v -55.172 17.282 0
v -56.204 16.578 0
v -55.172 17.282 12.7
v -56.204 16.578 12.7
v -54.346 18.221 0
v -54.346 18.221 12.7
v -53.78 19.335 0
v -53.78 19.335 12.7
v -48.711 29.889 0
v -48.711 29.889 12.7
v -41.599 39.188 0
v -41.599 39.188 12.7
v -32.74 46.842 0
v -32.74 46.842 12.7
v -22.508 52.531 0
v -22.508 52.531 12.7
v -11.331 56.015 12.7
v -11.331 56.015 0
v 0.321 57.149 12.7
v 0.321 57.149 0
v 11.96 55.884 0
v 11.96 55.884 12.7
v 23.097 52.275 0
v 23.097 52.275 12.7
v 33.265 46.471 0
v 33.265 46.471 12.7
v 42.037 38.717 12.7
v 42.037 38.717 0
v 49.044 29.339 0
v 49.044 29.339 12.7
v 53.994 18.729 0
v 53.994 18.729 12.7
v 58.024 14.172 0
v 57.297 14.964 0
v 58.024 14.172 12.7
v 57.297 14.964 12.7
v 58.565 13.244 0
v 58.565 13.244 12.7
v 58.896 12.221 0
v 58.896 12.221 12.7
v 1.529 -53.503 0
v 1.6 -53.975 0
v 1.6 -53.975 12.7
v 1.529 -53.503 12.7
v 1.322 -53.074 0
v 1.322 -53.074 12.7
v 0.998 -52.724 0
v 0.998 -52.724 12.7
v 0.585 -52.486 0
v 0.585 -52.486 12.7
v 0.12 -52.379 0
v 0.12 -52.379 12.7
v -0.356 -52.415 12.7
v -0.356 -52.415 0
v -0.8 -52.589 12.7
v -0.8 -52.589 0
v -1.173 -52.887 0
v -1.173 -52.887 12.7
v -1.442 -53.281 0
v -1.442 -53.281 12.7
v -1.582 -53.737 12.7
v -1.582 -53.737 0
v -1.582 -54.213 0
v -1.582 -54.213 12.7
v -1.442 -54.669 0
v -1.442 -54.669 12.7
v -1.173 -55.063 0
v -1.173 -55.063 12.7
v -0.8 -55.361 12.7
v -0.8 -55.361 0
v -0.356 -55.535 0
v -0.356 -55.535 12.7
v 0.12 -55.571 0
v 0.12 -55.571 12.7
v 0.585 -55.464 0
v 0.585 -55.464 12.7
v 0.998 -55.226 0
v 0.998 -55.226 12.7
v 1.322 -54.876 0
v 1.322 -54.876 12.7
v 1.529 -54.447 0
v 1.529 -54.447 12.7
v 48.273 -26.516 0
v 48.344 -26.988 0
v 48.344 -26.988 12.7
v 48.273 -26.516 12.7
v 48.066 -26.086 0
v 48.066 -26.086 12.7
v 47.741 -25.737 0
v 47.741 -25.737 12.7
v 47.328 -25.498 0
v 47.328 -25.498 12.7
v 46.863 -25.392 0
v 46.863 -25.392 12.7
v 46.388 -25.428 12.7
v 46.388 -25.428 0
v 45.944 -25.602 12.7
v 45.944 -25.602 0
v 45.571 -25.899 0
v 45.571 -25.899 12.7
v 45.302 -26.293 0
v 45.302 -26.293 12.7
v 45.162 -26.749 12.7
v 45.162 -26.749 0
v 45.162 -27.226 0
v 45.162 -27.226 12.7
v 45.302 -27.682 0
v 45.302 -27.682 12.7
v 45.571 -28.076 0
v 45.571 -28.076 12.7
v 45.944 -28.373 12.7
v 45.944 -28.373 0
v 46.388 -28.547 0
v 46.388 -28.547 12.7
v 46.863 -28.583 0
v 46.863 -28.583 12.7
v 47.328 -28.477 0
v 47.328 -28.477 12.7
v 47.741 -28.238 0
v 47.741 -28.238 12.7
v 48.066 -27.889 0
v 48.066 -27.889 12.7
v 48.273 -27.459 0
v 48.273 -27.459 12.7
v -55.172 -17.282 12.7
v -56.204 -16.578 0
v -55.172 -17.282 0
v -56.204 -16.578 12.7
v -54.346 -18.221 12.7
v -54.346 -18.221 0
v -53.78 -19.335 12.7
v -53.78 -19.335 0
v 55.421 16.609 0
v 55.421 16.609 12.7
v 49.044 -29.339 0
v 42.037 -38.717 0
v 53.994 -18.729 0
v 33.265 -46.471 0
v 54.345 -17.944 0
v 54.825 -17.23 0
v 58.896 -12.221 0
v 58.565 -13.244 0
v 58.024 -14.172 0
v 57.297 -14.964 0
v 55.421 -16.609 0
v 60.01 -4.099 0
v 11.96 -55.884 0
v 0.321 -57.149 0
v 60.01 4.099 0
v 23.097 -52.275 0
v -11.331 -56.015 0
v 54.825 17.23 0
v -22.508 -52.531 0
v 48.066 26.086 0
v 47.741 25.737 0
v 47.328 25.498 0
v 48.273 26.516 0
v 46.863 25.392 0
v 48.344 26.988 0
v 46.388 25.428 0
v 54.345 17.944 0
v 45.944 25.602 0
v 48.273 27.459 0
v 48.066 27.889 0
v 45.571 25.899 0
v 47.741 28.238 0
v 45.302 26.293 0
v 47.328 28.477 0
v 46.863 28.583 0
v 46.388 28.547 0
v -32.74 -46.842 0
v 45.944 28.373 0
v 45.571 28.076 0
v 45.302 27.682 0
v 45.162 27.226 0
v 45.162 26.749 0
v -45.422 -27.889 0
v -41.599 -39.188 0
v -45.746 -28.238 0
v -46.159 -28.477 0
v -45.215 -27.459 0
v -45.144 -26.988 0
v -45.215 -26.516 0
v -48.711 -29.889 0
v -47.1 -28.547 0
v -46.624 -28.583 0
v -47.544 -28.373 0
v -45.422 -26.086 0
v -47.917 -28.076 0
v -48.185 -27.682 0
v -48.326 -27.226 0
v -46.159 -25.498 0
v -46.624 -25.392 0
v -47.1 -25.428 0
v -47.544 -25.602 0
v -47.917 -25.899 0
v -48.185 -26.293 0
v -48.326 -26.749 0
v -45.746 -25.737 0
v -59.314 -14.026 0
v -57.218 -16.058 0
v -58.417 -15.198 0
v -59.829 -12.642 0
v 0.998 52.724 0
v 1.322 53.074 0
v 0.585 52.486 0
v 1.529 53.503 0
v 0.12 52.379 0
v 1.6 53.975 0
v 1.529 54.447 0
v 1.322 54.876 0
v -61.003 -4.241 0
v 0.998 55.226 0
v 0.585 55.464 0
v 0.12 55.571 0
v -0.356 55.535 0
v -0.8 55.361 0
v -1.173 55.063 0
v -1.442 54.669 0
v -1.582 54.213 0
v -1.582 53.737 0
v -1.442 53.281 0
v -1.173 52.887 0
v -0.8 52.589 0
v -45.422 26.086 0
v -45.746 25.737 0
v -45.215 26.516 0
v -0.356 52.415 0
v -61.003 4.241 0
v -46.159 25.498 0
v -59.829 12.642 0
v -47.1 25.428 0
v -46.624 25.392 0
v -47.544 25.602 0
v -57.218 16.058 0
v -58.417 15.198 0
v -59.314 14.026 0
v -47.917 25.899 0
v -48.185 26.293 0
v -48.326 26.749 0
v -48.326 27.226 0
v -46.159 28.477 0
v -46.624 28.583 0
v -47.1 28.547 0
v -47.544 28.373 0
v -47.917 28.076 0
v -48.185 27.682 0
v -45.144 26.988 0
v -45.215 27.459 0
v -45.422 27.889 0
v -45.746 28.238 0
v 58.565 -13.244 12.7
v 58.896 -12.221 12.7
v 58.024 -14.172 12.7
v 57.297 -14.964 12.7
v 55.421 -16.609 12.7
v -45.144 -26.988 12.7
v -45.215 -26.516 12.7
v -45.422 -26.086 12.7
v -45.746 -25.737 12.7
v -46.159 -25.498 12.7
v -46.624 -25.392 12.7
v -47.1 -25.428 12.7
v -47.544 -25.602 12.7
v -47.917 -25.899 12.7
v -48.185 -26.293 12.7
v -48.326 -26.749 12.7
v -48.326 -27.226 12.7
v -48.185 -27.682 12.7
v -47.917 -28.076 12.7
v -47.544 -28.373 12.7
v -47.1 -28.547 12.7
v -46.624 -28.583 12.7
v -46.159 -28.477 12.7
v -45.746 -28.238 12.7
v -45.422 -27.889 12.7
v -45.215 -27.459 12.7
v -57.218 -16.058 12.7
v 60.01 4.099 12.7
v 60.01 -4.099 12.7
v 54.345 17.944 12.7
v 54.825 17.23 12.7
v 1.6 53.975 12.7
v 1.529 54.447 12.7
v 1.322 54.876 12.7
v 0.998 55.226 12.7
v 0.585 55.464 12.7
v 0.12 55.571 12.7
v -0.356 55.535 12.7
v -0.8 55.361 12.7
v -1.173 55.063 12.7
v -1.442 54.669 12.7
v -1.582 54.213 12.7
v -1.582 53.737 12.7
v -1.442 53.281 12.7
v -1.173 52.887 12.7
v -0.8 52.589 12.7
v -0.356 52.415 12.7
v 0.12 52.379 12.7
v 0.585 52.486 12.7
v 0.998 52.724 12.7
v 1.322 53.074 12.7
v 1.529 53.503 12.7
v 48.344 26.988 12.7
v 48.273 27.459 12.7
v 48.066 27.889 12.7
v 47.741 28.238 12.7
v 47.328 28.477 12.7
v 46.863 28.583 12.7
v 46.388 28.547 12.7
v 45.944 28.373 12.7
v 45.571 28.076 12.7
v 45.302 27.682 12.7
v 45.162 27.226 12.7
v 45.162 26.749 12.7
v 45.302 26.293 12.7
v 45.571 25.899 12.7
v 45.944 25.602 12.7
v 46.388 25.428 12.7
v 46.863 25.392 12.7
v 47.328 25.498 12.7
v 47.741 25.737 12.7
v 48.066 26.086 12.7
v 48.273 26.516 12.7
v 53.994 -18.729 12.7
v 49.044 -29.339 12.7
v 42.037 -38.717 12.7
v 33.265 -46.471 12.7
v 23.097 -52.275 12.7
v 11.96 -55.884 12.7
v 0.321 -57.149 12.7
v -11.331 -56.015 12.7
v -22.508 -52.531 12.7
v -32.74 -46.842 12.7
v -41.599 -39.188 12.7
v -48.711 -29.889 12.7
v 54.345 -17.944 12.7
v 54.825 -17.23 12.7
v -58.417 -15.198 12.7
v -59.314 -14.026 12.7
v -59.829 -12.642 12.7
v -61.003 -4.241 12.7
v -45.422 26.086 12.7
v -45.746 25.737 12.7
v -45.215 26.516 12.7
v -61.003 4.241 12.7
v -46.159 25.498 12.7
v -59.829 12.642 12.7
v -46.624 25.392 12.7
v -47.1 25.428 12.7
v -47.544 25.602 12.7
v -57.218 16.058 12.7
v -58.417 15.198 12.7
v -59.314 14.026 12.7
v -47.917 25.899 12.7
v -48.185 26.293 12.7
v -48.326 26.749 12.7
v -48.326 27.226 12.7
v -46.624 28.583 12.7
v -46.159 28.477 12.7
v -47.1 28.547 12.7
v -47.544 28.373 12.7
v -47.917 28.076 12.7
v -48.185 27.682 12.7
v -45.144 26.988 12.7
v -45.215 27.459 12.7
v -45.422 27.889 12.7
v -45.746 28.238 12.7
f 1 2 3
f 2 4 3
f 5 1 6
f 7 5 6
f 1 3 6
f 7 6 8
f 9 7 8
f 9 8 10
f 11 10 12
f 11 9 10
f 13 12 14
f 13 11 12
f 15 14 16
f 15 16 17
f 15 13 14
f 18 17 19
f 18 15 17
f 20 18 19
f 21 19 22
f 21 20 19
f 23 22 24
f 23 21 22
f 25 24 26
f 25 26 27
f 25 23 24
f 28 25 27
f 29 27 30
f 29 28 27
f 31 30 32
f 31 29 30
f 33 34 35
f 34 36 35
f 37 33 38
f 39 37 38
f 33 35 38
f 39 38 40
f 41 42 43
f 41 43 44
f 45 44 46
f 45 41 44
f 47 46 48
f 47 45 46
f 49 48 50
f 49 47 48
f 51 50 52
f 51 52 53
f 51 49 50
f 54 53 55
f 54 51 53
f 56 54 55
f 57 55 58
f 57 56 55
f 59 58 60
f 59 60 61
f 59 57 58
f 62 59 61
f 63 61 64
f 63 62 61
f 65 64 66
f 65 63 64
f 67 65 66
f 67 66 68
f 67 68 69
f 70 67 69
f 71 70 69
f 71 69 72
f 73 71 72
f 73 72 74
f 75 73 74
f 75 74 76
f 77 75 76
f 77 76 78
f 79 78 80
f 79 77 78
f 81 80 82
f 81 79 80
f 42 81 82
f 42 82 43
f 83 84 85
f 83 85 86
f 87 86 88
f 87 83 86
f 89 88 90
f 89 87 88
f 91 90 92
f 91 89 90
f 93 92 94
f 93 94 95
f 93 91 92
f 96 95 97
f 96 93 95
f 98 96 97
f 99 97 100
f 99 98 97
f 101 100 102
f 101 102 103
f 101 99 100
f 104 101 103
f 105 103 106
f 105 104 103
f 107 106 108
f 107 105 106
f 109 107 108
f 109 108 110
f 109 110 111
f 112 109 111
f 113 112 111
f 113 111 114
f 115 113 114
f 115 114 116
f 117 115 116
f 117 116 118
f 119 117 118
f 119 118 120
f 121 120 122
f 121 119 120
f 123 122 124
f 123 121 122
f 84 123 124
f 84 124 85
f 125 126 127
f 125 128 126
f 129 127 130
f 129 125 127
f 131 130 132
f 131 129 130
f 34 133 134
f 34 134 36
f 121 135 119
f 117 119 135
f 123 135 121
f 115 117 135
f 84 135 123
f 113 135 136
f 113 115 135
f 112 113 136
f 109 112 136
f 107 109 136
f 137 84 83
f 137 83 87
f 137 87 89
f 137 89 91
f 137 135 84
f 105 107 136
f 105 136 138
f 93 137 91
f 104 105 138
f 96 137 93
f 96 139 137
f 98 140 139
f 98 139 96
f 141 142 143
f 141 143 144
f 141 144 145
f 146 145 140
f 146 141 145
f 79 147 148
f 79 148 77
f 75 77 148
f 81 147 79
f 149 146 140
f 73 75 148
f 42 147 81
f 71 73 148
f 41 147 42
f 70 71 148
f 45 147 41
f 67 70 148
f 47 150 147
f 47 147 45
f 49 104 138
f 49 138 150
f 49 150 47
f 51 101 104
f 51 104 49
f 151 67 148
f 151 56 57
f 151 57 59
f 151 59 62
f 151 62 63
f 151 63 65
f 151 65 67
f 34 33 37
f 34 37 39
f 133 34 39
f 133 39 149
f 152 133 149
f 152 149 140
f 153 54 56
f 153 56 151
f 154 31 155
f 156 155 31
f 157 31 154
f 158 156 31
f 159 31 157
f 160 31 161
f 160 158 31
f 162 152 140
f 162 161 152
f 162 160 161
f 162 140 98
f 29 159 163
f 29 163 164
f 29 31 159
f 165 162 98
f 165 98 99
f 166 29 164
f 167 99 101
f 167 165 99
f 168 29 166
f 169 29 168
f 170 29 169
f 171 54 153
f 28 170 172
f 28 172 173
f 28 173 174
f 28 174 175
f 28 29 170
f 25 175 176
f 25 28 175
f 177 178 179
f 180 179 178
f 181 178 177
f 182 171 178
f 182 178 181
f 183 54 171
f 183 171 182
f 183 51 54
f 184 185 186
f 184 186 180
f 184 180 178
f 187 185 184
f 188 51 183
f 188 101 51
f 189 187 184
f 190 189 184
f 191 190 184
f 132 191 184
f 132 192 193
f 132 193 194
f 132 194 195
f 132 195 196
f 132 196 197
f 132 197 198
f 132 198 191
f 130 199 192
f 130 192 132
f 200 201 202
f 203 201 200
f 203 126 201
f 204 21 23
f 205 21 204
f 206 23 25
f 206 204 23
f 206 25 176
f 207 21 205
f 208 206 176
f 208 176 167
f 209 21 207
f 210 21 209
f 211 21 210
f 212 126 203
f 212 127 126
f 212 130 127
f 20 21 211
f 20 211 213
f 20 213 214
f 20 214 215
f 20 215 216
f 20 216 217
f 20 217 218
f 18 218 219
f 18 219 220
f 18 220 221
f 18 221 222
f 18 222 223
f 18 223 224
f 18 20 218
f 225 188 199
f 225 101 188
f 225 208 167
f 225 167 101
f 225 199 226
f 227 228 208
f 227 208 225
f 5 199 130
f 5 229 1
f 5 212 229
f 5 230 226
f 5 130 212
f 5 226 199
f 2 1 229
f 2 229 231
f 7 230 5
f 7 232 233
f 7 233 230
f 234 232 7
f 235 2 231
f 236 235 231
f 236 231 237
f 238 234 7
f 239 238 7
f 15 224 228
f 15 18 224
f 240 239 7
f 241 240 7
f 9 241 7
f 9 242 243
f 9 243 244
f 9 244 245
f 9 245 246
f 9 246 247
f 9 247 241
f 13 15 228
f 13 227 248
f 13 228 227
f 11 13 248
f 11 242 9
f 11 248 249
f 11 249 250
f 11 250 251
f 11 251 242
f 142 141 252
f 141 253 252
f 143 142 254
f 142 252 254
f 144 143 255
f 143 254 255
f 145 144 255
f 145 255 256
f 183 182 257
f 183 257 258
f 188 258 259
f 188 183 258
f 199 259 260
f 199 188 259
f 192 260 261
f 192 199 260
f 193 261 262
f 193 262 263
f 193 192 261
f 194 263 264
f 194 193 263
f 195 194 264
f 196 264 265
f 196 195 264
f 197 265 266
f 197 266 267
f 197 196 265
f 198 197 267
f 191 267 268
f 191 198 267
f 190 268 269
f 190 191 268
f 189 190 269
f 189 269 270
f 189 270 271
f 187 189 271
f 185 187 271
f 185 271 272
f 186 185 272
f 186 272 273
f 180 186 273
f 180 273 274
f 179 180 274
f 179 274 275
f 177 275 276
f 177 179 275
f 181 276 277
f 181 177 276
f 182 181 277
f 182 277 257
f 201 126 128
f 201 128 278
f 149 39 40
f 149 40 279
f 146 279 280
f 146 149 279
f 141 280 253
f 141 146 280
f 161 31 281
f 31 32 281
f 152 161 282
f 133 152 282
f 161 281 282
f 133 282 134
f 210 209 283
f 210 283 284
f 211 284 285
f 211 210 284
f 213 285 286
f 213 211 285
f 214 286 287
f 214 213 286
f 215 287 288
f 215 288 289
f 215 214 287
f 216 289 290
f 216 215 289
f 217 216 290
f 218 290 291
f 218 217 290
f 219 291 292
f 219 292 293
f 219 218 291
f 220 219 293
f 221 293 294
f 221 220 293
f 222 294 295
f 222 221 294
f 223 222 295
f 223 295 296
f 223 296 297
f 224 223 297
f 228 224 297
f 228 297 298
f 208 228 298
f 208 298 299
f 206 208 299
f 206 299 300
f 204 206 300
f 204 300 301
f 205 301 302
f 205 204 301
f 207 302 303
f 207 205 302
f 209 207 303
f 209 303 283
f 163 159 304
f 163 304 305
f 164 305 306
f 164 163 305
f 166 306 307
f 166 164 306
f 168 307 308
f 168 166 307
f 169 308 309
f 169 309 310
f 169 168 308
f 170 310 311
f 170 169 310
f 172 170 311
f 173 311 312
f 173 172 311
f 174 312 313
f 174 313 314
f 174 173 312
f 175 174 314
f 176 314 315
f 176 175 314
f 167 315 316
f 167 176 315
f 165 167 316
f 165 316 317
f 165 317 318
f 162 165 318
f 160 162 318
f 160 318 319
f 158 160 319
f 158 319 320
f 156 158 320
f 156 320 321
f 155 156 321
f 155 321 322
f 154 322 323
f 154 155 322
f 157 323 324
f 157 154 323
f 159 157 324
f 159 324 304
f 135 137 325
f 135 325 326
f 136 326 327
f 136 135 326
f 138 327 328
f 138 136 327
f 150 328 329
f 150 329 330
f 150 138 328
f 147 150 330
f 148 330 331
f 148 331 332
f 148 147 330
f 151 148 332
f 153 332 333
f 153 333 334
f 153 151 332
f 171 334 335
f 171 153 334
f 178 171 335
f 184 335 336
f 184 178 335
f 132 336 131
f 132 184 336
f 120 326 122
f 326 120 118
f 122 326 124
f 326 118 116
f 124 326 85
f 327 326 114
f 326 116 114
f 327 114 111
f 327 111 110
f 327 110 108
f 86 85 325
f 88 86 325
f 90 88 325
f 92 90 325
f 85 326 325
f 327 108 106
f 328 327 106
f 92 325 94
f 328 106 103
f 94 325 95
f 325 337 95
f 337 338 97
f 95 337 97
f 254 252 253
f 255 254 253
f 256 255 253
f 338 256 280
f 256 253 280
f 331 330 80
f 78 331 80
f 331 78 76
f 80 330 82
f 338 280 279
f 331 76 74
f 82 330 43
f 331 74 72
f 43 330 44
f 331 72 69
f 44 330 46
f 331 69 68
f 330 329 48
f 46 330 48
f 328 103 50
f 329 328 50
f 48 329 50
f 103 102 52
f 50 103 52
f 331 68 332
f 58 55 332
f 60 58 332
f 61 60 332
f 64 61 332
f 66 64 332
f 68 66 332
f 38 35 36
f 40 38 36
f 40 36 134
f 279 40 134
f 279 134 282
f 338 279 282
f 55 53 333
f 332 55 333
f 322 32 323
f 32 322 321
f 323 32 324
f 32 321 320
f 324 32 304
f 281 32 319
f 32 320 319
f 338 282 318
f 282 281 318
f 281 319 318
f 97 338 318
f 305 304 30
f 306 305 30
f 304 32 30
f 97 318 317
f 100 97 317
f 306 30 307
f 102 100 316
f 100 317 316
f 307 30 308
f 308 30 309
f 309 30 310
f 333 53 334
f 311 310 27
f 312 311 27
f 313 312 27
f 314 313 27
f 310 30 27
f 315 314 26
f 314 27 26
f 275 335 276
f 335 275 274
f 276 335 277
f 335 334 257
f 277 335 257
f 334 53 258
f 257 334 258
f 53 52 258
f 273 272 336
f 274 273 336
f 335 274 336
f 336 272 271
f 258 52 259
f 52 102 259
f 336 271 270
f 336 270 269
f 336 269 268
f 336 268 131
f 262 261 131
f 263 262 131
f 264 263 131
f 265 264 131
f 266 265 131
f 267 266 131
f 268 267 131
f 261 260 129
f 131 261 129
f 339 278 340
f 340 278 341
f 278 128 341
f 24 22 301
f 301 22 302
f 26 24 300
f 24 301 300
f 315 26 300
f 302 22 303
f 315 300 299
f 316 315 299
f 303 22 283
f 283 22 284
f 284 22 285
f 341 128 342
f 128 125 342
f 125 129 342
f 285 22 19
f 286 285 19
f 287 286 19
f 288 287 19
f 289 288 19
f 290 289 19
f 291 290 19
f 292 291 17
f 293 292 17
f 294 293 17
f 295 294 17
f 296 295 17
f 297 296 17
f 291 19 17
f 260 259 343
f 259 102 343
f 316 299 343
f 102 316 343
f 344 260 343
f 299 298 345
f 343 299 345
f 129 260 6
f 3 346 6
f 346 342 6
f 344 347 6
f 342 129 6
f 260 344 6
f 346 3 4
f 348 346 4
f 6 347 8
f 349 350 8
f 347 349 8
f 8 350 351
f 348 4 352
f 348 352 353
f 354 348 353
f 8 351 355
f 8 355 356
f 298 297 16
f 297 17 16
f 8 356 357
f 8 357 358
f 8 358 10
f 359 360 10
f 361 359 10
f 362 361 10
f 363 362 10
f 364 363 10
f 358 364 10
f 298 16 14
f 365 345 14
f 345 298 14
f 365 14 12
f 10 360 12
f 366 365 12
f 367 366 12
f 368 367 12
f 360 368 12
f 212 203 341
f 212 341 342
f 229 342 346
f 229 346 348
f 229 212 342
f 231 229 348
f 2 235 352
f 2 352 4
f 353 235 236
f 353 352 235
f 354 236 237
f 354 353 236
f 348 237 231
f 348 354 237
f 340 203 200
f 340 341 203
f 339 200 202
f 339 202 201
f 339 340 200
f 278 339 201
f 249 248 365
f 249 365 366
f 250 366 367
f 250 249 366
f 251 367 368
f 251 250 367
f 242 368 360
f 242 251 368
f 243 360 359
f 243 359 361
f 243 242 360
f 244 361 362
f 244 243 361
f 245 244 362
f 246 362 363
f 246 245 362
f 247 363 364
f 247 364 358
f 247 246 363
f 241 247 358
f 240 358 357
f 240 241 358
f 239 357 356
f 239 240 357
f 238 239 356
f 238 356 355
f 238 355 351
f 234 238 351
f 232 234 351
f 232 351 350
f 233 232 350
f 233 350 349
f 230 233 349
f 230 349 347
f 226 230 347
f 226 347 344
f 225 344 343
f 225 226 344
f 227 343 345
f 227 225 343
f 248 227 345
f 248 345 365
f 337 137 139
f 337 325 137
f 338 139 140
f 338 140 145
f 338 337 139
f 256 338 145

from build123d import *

# Parameters (mm, degrees)
SKETCH1_R           = 1.6
BOSS_EXTRUDE1_DEPTH = 12.7
FILLET1_R           = 5


with BuildPart() as part:
    # Sketch1 → Boss-Extrude1 (new body)
    with BuildSketch(Plane.XY):
        with BuildLine():
            Line((-59.281721466, 15), (-54.404710274, 17.5))
            ThreePointArc((-54.404710274, 17.5), (0, 57.15), (54.404710274, 17.5))
            Line((54.404710274, 17.5), (58.525108251, 13.886475587))
            ThreePointArc((58.525108251, 13.886475587), (60.15, 0), (58.525108251, -13.886475587))
            Line((58.525108251, -13.886475587), (54.404710274, -17.5))
            ThreePointArc((54.404710274, -17.5), (0, -57.15), (-54.404710274, -17.5))
            Line((-54.404710274, -17.5), (-59.281721466, -15))
            ThreePointArc((-59.281721466, -15), (-61.15, 0), (-59.281721466, 15))
        make_face()
        with Locations((0, 53.975)):
            Circle(SKETCH1_R, mode=Mode.SUBTRACT)
        with Locations((46.743721169, 26.9875)):
            Circle(SKETCH1_R, mode=Mode.SUBTRACT)
        with Locations((46.743721169, -26.9875)):
            Circle(SKETCH1_R, mode=Mode.SUBTRACT)
        with Locations((0, -53.975)):
            Circle(SKETCH1_R, mode=Mode.SUBTRACT)
        with Locations((-46.743721169, -26.9875)):
            Circle(SKETCH1_R, mode=Mode.SUBTRACT)
        with Locations((-46.743721169, 26.9875)):
            Circle(SKETCH1_R, mode=Mode.SUBTRACT)
    extrude(amount=BOSS_EXTRUDE1_DEPTH)

    # Fillet1
    fillet1_edges = [part.edges().sort_by_distance(p)[0] for p in [
        (58.525108251, -13.886475587, 6.35),
        (54.404710274, -17.5, 6.35),
        (-54.404710274, -17.5, 6.35),
        (-59.281721466, -15, 6.35),
        (-59.281721466, 15, 6.35),
        (-54.404710274, 17.5, 6.35),
        (54.404710274, 17.5, 6.35),
        (58.525108251, 13.886475587, 6.35),
    ]]
    fillet(fillet1_edges, radius=FILLET1_R)


solid = part.part
